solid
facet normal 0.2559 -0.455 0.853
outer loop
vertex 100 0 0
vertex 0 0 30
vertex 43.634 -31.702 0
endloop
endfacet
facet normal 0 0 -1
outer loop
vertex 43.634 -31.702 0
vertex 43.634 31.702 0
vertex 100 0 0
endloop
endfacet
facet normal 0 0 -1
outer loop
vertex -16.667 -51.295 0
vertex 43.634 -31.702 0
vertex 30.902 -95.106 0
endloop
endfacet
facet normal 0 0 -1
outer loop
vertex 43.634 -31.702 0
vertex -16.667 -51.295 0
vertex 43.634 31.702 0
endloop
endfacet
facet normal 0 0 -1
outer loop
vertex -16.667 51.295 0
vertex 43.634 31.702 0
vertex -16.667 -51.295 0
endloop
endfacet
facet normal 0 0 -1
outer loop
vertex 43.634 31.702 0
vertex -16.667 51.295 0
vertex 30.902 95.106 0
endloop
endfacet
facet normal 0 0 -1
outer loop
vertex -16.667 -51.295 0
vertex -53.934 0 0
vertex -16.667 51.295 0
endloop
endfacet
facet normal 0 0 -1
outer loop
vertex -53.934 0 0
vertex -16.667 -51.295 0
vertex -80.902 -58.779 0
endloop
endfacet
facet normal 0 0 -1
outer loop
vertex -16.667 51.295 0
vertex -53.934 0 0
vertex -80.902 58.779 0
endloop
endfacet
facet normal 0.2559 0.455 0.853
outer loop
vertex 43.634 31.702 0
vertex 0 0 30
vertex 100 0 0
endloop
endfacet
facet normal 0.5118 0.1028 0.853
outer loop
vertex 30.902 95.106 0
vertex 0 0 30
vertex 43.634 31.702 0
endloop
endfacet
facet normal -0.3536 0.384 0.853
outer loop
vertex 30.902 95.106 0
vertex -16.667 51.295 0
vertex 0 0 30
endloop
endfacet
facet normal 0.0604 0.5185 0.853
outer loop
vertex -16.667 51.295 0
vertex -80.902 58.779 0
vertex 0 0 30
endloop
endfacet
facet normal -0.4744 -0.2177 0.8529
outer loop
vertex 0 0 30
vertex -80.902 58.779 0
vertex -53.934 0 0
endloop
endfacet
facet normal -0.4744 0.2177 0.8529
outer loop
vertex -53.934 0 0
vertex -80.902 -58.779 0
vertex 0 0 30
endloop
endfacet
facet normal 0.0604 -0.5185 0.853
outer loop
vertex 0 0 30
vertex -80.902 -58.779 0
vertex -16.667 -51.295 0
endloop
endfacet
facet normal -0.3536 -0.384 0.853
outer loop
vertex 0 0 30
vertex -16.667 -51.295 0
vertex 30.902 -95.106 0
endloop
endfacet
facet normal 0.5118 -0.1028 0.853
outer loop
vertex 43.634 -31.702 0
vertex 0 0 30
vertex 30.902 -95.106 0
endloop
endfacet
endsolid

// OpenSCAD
k=5;//[3:1:20]
alpha=360/k;
high=30;//[1:1:100]
r1=50;//[1:1:100]
r2=100;//[1:1:100]
for (i=[0:alpha:360]){
rotate(a=i,v=[0,0,1]){
polyhedron(
points=[[0,0,0],[0,0,high],[r1*cos(alpha),r1*sin(alpha),0],[r2,0,0],[r1*cos(alpha),-r1*sin(alpha),0]],
faces=[[0,1,4],[0,2,1],[1,3,4],[1,2,3],[0,4,2],[4,3,2]]
);
  }
    }
